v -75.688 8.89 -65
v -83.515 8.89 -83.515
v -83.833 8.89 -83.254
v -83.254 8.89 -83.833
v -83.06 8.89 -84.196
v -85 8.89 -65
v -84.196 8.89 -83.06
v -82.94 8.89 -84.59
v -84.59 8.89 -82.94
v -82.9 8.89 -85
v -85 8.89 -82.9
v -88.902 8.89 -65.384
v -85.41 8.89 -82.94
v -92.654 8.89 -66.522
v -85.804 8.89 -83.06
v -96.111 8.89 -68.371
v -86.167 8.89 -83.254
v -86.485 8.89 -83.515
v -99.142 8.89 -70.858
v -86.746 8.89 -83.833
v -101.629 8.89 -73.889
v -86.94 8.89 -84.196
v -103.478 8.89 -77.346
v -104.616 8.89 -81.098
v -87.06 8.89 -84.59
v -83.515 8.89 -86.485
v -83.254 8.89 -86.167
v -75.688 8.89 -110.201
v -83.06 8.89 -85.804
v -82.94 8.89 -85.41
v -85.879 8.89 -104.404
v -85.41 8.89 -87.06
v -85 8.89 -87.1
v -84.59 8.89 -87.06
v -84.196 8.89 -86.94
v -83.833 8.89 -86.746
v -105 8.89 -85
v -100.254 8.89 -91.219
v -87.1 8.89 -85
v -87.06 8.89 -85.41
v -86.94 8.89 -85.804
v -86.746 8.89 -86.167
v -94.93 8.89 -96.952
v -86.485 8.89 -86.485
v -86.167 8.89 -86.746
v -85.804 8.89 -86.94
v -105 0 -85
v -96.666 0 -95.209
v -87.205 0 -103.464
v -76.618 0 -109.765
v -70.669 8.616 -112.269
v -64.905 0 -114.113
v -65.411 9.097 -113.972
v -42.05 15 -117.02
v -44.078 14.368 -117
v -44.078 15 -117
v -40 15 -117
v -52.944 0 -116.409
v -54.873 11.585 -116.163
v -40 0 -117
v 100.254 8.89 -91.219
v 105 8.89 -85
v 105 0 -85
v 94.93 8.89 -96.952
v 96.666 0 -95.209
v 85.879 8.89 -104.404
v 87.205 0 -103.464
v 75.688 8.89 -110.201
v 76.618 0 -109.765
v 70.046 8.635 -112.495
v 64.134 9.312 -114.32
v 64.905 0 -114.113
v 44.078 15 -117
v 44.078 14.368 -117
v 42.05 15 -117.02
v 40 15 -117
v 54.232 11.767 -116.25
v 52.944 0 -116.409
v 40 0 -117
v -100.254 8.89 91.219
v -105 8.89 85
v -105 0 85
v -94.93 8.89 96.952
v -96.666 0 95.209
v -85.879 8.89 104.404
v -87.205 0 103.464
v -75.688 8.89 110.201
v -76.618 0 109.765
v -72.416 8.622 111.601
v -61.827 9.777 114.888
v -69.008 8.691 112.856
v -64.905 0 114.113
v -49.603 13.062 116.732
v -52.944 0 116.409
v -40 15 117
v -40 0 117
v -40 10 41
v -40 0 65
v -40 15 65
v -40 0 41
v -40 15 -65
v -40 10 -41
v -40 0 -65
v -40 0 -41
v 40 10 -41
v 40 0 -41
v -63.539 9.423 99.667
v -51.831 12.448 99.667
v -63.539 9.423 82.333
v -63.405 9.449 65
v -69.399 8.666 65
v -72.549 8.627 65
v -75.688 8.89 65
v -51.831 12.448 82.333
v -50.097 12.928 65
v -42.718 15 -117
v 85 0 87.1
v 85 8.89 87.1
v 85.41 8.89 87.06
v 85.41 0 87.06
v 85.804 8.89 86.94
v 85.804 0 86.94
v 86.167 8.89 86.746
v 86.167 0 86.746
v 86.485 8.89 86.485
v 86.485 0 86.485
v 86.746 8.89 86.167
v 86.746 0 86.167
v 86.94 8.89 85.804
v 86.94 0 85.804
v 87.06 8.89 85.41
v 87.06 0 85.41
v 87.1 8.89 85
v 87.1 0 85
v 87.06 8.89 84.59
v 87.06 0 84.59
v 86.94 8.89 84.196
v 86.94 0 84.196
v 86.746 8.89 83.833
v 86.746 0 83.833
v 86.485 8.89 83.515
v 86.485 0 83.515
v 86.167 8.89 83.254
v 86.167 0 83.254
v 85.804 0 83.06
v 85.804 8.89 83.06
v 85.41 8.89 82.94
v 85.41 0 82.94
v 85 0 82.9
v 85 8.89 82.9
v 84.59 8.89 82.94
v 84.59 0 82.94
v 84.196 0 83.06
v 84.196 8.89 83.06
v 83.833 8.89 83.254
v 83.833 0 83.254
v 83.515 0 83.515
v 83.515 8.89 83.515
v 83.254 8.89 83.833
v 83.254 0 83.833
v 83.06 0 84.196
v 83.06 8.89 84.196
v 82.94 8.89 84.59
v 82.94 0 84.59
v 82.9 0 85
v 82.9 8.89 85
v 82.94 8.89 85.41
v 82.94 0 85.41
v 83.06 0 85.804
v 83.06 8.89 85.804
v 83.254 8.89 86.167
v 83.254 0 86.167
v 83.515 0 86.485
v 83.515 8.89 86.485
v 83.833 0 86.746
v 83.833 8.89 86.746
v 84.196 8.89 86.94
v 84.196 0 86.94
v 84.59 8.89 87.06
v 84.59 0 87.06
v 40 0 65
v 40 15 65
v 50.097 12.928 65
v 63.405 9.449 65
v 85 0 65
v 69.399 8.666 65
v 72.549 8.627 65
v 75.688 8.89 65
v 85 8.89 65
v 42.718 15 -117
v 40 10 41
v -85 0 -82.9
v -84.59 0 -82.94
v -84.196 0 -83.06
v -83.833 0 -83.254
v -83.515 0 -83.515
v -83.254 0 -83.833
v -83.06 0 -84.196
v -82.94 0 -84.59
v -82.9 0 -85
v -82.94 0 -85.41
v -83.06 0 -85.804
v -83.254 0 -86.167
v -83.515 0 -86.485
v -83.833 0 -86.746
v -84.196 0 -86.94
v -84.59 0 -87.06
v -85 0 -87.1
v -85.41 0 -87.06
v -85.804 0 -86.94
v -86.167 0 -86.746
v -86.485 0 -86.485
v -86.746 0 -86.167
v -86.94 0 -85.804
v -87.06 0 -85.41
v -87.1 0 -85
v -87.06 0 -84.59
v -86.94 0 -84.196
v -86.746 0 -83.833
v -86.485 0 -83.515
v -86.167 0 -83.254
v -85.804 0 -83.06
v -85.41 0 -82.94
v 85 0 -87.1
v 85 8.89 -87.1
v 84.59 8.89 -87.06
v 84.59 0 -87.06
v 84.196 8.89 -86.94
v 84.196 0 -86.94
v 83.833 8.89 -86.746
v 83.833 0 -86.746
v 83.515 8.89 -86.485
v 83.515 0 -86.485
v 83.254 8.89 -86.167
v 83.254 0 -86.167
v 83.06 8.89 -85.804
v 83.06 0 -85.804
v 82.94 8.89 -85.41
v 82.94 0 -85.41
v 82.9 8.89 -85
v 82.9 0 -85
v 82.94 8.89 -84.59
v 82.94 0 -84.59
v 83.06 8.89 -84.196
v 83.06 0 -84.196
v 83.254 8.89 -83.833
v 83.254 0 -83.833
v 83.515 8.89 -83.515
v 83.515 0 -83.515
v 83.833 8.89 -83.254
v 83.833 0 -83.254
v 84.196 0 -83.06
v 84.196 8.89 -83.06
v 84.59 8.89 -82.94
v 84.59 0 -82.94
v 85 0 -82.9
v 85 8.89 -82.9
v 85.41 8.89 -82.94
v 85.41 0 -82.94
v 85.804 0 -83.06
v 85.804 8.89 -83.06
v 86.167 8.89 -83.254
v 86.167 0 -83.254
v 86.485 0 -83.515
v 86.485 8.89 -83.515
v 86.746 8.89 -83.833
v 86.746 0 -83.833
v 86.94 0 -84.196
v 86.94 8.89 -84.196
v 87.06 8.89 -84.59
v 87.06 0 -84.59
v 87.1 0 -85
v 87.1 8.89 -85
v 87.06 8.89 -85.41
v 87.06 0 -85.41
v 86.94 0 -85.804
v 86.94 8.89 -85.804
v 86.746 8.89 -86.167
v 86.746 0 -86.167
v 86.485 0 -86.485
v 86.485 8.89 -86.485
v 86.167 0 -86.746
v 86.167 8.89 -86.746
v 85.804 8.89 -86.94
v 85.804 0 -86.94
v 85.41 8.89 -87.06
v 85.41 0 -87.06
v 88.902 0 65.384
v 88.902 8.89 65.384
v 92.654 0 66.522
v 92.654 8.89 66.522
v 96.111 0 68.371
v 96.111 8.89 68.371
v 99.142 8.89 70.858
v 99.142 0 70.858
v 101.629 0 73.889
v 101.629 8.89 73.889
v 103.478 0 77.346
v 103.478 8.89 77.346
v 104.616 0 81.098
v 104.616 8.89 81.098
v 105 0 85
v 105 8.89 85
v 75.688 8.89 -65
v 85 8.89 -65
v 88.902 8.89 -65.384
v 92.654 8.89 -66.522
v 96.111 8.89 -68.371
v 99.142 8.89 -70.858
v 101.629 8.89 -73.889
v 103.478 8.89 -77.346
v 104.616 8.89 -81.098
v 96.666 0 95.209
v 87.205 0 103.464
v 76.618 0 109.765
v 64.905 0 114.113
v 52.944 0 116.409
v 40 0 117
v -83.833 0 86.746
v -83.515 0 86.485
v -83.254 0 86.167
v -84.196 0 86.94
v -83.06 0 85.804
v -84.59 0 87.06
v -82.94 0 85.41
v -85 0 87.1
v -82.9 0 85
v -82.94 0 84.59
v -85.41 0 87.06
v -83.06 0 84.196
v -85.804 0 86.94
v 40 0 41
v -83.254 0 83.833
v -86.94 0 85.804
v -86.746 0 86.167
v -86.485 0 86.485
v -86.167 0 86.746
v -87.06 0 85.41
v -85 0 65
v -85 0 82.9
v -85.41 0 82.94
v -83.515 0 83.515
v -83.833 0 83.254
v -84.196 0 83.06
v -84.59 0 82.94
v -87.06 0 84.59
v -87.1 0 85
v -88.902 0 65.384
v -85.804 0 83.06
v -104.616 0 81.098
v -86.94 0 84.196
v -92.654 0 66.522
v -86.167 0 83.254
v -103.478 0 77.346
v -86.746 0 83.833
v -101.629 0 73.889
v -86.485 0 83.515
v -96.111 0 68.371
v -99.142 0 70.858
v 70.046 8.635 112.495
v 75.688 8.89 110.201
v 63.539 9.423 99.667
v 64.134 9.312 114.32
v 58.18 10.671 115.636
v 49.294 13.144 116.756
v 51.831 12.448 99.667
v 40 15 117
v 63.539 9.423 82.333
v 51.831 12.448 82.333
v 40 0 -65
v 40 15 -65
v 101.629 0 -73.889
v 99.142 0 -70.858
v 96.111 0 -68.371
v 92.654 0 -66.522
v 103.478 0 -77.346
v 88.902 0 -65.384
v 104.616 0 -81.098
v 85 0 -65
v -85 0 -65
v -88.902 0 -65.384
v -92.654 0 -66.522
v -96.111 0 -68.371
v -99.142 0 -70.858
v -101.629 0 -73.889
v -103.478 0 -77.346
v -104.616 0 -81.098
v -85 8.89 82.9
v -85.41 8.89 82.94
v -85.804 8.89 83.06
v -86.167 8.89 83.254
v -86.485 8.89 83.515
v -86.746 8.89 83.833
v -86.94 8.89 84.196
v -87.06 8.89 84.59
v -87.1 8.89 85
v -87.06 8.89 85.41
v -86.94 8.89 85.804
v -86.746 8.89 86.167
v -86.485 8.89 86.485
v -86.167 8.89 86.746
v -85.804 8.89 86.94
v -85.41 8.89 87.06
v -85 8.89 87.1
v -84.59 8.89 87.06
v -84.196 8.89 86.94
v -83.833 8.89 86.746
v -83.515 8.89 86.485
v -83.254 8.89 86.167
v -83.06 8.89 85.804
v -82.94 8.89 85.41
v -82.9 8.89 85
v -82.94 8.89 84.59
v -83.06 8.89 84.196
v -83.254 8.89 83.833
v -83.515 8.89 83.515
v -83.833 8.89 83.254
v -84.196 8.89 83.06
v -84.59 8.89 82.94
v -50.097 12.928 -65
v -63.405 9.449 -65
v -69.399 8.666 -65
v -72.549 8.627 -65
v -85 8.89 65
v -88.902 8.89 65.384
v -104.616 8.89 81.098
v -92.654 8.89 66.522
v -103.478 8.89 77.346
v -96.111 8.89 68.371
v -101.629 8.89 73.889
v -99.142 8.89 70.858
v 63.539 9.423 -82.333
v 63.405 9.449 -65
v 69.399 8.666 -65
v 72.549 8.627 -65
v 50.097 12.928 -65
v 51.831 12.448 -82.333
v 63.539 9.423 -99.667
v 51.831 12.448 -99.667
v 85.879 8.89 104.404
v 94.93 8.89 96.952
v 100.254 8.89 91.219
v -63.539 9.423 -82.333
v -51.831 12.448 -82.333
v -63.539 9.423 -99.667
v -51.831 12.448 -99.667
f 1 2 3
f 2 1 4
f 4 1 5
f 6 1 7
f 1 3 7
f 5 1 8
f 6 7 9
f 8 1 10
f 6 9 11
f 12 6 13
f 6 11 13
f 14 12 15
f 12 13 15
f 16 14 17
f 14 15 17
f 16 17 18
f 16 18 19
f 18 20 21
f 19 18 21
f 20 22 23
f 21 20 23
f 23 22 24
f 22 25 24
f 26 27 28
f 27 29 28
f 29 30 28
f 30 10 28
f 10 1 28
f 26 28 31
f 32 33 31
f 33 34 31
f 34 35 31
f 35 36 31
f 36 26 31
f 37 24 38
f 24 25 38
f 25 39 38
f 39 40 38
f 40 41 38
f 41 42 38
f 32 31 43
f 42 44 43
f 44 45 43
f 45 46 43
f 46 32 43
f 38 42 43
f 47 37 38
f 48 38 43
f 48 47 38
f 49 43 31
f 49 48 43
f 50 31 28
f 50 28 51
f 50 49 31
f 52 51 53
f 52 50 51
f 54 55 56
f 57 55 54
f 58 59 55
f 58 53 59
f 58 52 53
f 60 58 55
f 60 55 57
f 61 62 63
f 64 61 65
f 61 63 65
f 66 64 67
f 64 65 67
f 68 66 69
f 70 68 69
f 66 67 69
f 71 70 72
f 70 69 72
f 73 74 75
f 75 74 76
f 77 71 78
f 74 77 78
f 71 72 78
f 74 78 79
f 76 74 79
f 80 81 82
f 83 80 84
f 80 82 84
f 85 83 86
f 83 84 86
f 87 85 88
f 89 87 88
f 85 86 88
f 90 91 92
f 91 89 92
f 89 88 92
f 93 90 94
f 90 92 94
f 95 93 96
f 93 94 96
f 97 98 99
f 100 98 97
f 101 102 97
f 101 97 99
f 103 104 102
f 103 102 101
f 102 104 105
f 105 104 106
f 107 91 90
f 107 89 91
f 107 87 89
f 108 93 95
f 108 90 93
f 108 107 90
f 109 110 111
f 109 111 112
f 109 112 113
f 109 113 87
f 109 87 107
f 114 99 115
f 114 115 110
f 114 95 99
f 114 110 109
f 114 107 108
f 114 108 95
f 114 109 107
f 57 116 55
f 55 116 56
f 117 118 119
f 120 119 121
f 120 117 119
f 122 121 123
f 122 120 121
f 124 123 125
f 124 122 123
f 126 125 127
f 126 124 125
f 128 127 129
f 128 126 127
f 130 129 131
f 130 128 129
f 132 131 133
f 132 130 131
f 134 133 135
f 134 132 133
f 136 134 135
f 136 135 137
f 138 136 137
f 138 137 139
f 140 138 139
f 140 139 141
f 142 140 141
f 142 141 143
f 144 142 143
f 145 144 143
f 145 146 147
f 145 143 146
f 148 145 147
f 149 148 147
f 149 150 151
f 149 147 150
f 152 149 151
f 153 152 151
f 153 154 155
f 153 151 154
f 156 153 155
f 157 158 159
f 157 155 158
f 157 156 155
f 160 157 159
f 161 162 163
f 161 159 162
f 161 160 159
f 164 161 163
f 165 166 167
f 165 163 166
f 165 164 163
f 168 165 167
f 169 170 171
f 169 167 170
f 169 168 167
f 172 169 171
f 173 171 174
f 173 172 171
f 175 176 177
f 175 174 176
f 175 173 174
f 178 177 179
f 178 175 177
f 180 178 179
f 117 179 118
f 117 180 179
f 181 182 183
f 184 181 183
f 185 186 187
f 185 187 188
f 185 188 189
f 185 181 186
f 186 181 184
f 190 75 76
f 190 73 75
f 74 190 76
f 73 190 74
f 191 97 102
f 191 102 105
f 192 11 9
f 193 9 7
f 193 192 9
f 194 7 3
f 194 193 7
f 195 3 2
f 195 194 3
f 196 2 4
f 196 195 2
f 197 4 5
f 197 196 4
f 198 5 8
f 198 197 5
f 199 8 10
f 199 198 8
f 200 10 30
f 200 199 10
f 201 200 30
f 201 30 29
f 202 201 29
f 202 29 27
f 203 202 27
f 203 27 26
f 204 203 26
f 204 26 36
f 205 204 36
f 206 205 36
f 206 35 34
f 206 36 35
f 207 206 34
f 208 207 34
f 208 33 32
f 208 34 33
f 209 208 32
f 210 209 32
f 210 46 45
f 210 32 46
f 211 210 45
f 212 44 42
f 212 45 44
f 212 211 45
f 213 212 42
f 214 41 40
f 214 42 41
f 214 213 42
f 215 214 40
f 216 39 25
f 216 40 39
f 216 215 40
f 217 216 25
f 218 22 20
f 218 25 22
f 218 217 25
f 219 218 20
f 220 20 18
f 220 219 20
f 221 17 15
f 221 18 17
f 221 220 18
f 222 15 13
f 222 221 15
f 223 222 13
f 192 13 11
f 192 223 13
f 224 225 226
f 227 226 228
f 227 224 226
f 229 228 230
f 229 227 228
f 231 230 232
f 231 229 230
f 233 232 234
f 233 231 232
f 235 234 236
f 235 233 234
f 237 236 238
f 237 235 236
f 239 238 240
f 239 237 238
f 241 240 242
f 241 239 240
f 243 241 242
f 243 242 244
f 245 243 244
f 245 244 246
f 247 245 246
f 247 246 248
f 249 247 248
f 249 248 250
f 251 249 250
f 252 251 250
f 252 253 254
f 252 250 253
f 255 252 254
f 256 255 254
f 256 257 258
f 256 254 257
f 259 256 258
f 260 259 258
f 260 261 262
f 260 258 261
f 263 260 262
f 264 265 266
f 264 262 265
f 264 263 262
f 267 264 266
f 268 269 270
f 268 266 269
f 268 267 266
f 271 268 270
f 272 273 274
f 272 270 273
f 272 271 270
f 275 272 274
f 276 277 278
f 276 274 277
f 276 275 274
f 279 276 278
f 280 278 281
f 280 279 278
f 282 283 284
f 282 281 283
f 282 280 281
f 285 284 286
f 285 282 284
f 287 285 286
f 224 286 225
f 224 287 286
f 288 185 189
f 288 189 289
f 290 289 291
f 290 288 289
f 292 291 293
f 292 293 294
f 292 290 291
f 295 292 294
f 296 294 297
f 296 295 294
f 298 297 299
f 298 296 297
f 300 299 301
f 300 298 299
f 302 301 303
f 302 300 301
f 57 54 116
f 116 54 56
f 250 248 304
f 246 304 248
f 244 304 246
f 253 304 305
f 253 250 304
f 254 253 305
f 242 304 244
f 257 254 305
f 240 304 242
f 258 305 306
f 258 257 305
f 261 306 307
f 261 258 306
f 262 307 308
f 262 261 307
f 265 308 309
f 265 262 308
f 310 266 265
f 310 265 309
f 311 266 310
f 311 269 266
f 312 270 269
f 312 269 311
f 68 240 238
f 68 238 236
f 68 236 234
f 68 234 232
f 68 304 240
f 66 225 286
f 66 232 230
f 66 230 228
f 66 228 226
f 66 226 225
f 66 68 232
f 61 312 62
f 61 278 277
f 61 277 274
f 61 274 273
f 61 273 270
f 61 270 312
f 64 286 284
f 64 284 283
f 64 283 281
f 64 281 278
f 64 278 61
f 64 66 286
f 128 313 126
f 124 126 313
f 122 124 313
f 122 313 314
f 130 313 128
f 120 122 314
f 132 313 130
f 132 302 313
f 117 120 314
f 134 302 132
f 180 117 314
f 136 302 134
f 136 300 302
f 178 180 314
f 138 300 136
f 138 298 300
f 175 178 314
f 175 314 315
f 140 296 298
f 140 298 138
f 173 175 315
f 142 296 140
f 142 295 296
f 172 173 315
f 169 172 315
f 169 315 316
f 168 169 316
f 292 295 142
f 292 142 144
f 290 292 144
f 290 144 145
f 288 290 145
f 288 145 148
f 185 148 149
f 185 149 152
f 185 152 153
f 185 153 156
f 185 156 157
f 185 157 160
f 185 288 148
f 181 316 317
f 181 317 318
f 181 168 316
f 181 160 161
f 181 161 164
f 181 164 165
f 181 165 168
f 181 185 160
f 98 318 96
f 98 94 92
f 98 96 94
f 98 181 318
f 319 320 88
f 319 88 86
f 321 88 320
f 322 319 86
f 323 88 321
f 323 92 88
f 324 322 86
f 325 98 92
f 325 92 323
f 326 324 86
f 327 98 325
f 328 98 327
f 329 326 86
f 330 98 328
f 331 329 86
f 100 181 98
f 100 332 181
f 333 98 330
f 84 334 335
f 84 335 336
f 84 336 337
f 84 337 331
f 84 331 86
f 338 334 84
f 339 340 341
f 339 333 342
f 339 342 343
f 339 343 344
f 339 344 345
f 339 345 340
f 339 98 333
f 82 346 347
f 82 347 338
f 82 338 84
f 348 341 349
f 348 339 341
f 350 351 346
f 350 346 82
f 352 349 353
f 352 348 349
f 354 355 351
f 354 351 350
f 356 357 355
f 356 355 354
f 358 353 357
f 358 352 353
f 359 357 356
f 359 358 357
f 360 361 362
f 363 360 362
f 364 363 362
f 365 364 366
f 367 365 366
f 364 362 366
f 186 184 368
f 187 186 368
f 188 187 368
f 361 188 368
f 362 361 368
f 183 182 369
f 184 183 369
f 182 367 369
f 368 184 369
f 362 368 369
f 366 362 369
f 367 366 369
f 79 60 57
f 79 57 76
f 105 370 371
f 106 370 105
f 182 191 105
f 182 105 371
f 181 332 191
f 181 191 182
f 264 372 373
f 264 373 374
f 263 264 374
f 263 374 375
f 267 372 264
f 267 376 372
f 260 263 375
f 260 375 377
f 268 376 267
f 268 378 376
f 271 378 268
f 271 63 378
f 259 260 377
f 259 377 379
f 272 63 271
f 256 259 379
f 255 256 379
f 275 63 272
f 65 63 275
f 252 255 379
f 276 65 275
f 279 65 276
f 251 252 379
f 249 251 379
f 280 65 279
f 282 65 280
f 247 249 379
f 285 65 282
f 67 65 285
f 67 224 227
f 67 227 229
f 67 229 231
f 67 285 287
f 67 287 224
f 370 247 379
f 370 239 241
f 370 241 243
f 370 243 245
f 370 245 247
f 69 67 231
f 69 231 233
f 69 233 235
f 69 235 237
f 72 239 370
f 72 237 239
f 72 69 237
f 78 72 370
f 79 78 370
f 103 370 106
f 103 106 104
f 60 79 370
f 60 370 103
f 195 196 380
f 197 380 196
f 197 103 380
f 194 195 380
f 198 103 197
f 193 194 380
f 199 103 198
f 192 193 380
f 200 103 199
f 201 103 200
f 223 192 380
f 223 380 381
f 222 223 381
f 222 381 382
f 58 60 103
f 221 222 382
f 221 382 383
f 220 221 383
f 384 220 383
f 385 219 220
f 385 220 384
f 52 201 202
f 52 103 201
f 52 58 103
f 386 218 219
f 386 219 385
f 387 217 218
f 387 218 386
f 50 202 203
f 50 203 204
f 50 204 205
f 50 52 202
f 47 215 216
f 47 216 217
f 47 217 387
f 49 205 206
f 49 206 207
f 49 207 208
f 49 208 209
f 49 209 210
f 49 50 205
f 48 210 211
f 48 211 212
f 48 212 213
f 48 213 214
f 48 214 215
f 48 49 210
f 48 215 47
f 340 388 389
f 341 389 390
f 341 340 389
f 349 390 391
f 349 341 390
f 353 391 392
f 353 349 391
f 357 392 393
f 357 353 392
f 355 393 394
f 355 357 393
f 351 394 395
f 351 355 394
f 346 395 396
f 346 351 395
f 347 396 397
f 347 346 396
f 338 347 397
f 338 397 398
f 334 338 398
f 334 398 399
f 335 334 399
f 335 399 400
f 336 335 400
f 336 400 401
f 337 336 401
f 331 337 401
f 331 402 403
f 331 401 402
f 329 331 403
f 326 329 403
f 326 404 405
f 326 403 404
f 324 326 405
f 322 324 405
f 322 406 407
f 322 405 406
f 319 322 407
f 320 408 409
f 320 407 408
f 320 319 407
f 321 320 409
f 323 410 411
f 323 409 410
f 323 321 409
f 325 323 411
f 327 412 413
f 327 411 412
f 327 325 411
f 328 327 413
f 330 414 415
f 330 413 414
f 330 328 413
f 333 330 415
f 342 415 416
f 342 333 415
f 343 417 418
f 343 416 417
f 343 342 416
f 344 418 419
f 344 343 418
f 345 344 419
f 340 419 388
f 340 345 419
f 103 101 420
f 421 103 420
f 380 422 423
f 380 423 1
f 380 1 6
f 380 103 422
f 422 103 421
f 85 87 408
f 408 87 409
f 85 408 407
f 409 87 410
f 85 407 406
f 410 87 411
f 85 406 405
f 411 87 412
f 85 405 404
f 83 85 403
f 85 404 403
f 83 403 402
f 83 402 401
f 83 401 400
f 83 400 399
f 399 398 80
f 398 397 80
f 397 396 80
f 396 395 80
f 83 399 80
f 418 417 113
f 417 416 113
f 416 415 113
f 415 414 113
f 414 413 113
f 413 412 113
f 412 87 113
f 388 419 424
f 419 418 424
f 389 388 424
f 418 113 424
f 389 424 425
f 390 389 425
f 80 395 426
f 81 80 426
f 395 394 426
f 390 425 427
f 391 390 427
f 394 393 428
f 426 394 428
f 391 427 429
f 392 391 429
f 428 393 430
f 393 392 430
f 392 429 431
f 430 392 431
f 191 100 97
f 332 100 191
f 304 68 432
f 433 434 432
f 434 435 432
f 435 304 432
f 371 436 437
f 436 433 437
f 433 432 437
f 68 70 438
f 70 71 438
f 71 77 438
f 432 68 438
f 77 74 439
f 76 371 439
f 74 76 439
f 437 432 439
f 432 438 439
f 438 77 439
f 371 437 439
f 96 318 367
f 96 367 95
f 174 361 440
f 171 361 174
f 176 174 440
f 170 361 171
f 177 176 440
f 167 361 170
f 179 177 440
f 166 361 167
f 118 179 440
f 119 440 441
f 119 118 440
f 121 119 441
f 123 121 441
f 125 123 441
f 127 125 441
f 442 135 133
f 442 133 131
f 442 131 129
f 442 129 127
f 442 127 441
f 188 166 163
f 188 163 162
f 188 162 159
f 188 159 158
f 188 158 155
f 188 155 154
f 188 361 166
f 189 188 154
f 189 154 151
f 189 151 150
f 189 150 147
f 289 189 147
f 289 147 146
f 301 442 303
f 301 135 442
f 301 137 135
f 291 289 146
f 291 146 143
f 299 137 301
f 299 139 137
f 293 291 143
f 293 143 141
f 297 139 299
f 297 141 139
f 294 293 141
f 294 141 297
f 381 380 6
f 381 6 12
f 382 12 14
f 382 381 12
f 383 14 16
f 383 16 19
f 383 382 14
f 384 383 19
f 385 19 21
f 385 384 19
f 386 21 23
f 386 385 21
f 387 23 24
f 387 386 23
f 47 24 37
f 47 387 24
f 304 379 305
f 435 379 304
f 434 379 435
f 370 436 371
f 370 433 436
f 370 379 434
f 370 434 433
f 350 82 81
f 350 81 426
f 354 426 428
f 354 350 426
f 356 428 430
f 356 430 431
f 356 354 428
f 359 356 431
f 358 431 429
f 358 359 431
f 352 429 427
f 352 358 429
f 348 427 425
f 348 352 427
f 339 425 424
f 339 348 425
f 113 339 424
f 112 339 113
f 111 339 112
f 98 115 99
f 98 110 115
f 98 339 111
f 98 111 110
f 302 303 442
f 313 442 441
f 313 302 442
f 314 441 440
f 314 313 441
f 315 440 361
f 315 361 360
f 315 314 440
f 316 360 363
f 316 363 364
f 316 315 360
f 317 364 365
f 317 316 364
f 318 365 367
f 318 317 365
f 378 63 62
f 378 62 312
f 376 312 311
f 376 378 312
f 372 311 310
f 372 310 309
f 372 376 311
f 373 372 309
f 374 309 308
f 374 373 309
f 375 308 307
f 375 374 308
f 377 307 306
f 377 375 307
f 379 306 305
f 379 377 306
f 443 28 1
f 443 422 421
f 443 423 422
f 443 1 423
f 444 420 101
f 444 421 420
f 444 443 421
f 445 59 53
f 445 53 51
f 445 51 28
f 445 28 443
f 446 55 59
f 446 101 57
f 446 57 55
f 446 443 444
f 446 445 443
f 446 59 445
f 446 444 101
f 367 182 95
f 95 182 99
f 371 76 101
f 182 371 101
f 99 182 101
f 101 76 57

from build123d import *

# Parameters (mm, degrees)
SKETCH1_R           = 2.1
BOSS_EXTRUDE1_DEPTH = 15
SKETCH2_W           = 82
SKETCH2_H           = 82
CUT_EXTRUDE1_DEPTH  = 10
CUT_EXTRUDE2_DEPTH  = 257.934619876


with BuildPart() as part:
    # Sketch1 → Boss-Extrude1 (new body)
    with BuildSketch(Plane(origin=(0, 0, 0), x_dir=(1, 0, 0), z_dir=(0, 1, 0))):
        with BuildLine():
            Line((-40, 117), (40, 117))
            add(Edge.make_bspline(
                [(105, 85), (82.19875176, 117.821973651), (40, 117)],
                knots=[0, 0, 0, 1, 1, 1], degree=2))
            ThreePointArc((105, 85), (99.142135624, 70.857864376), (85, 65))
            Line((85, 65), (40, 65))
            Line((40, 65), (40, -65))
            Line((40, -65), (85, -65))
            ThreePointArc((85, -65), (99.142135624, -70.857864376), (105, -85))
            add(Edge.make_bspline(
                [(105, -85), (82.19875176, -117.821973651), (40, -117)],
                knots=[0, 0, 0, 1, 1, 1], degree=2))
            Line((40, -117), (-40, -117))
            add(Edge.make_bspline(
                [(-105, -85), (-82.19875176, -117.821973651), (-40, -117)],
                knots=[0, 0, 0, 1, 1, 1], degree=2))
            ThreePointArc((-105, -85), (-99.142135624, -70.857864376), (-85, -65))
            Line((-85, -65), (-40, -65))
            Line((-40, -65), (-40, 65))
            Line((-40, 65), (-85, 65))
            ThreePointArc((-85, 65), (-99.142135624, 70.857864376), (-105, 85))
            add(Edge.make_bspline(
                [(-105, 85), (-82.19875176, 117.821973651), (-40, 117)],
                knots=[0, 0, 0, 1, 1, 1], degree=2))
        make_face()
        with Locations(Location((-85, 85, 0), (0, 0, 270))):
            Circle(SKETCH1_R, mode=Mode.SUBTRACT)
        with Locations(Location((85, 85, 0), (0, 0, 90))):
            Circle(SKETCH1_R, mode=Mode.SUBTRACT)
        with Locations(Location((-85, -85, 0), (0, 0, 90))):
            Circle(SKETCH1_R, mode=Mode.SUBTRACT)
        with Locations(Location((85, -85, 0), (0, 0, 270))):
            Circle(SKETCH1_R, mode=Mode.SUBTRACT)
    extrude(amount=BOSS_EXTRUDE1_DEPTH)

    # Sketch2 → Cut-Extrude1 (cut)
    with BuildSketch(Plane.XZ):
        Rectangle(SKETCH2_W, SKETCH2_H)
    extrude(amount=-CUT_EXTRUDE1_DEPTH, mode=Mode.SUBTRACT)

    # Sketch3 → Cut-Extrude2 (cut, through all)
    with BuildSketch(Plane(origin=(0, 0, -117), x_dir=(-1, 0, 0), z_dir=(0, 0, -1))):
        with BuildLine():
            Line((-75.688086791, 8.8904517), (-105, 8.8904517))
            Line((-105, 8.8904517), (-105, 15))
            Line((-105, 15), (-40, 15))
            add(Edge.make_bspline(
                [(-75.688086791, 8.8904517), (-63.128326114, 7.187324041), (-52.082553879, 13.673406614), (-40, 15)],
                knots=[0, 0, 0, 0, 1, 1, 1, 1], degree=3))
        make_face()
        with BuildLine():
            Line((105, 15), (40, 15))
            add(Edge.make_bspline(
                [(75.688086791, 8.8904517), (63.128326114, 7.187324041), (52.082553879, 13.673406614), (40, 15)],
                knots=[0, 0, 0, 0, 1, 1, 1, 1], degree=3))
            Line((75.688086791, 8.8904517), (105, 8.8904517))
            Line((105, 8.8904517), (105, 15))
        make_face()
    extrude(amount=-CUT_EXTRUDE2_DEPTH, mode=Mode.SUBTRACT)


solid = part.part
